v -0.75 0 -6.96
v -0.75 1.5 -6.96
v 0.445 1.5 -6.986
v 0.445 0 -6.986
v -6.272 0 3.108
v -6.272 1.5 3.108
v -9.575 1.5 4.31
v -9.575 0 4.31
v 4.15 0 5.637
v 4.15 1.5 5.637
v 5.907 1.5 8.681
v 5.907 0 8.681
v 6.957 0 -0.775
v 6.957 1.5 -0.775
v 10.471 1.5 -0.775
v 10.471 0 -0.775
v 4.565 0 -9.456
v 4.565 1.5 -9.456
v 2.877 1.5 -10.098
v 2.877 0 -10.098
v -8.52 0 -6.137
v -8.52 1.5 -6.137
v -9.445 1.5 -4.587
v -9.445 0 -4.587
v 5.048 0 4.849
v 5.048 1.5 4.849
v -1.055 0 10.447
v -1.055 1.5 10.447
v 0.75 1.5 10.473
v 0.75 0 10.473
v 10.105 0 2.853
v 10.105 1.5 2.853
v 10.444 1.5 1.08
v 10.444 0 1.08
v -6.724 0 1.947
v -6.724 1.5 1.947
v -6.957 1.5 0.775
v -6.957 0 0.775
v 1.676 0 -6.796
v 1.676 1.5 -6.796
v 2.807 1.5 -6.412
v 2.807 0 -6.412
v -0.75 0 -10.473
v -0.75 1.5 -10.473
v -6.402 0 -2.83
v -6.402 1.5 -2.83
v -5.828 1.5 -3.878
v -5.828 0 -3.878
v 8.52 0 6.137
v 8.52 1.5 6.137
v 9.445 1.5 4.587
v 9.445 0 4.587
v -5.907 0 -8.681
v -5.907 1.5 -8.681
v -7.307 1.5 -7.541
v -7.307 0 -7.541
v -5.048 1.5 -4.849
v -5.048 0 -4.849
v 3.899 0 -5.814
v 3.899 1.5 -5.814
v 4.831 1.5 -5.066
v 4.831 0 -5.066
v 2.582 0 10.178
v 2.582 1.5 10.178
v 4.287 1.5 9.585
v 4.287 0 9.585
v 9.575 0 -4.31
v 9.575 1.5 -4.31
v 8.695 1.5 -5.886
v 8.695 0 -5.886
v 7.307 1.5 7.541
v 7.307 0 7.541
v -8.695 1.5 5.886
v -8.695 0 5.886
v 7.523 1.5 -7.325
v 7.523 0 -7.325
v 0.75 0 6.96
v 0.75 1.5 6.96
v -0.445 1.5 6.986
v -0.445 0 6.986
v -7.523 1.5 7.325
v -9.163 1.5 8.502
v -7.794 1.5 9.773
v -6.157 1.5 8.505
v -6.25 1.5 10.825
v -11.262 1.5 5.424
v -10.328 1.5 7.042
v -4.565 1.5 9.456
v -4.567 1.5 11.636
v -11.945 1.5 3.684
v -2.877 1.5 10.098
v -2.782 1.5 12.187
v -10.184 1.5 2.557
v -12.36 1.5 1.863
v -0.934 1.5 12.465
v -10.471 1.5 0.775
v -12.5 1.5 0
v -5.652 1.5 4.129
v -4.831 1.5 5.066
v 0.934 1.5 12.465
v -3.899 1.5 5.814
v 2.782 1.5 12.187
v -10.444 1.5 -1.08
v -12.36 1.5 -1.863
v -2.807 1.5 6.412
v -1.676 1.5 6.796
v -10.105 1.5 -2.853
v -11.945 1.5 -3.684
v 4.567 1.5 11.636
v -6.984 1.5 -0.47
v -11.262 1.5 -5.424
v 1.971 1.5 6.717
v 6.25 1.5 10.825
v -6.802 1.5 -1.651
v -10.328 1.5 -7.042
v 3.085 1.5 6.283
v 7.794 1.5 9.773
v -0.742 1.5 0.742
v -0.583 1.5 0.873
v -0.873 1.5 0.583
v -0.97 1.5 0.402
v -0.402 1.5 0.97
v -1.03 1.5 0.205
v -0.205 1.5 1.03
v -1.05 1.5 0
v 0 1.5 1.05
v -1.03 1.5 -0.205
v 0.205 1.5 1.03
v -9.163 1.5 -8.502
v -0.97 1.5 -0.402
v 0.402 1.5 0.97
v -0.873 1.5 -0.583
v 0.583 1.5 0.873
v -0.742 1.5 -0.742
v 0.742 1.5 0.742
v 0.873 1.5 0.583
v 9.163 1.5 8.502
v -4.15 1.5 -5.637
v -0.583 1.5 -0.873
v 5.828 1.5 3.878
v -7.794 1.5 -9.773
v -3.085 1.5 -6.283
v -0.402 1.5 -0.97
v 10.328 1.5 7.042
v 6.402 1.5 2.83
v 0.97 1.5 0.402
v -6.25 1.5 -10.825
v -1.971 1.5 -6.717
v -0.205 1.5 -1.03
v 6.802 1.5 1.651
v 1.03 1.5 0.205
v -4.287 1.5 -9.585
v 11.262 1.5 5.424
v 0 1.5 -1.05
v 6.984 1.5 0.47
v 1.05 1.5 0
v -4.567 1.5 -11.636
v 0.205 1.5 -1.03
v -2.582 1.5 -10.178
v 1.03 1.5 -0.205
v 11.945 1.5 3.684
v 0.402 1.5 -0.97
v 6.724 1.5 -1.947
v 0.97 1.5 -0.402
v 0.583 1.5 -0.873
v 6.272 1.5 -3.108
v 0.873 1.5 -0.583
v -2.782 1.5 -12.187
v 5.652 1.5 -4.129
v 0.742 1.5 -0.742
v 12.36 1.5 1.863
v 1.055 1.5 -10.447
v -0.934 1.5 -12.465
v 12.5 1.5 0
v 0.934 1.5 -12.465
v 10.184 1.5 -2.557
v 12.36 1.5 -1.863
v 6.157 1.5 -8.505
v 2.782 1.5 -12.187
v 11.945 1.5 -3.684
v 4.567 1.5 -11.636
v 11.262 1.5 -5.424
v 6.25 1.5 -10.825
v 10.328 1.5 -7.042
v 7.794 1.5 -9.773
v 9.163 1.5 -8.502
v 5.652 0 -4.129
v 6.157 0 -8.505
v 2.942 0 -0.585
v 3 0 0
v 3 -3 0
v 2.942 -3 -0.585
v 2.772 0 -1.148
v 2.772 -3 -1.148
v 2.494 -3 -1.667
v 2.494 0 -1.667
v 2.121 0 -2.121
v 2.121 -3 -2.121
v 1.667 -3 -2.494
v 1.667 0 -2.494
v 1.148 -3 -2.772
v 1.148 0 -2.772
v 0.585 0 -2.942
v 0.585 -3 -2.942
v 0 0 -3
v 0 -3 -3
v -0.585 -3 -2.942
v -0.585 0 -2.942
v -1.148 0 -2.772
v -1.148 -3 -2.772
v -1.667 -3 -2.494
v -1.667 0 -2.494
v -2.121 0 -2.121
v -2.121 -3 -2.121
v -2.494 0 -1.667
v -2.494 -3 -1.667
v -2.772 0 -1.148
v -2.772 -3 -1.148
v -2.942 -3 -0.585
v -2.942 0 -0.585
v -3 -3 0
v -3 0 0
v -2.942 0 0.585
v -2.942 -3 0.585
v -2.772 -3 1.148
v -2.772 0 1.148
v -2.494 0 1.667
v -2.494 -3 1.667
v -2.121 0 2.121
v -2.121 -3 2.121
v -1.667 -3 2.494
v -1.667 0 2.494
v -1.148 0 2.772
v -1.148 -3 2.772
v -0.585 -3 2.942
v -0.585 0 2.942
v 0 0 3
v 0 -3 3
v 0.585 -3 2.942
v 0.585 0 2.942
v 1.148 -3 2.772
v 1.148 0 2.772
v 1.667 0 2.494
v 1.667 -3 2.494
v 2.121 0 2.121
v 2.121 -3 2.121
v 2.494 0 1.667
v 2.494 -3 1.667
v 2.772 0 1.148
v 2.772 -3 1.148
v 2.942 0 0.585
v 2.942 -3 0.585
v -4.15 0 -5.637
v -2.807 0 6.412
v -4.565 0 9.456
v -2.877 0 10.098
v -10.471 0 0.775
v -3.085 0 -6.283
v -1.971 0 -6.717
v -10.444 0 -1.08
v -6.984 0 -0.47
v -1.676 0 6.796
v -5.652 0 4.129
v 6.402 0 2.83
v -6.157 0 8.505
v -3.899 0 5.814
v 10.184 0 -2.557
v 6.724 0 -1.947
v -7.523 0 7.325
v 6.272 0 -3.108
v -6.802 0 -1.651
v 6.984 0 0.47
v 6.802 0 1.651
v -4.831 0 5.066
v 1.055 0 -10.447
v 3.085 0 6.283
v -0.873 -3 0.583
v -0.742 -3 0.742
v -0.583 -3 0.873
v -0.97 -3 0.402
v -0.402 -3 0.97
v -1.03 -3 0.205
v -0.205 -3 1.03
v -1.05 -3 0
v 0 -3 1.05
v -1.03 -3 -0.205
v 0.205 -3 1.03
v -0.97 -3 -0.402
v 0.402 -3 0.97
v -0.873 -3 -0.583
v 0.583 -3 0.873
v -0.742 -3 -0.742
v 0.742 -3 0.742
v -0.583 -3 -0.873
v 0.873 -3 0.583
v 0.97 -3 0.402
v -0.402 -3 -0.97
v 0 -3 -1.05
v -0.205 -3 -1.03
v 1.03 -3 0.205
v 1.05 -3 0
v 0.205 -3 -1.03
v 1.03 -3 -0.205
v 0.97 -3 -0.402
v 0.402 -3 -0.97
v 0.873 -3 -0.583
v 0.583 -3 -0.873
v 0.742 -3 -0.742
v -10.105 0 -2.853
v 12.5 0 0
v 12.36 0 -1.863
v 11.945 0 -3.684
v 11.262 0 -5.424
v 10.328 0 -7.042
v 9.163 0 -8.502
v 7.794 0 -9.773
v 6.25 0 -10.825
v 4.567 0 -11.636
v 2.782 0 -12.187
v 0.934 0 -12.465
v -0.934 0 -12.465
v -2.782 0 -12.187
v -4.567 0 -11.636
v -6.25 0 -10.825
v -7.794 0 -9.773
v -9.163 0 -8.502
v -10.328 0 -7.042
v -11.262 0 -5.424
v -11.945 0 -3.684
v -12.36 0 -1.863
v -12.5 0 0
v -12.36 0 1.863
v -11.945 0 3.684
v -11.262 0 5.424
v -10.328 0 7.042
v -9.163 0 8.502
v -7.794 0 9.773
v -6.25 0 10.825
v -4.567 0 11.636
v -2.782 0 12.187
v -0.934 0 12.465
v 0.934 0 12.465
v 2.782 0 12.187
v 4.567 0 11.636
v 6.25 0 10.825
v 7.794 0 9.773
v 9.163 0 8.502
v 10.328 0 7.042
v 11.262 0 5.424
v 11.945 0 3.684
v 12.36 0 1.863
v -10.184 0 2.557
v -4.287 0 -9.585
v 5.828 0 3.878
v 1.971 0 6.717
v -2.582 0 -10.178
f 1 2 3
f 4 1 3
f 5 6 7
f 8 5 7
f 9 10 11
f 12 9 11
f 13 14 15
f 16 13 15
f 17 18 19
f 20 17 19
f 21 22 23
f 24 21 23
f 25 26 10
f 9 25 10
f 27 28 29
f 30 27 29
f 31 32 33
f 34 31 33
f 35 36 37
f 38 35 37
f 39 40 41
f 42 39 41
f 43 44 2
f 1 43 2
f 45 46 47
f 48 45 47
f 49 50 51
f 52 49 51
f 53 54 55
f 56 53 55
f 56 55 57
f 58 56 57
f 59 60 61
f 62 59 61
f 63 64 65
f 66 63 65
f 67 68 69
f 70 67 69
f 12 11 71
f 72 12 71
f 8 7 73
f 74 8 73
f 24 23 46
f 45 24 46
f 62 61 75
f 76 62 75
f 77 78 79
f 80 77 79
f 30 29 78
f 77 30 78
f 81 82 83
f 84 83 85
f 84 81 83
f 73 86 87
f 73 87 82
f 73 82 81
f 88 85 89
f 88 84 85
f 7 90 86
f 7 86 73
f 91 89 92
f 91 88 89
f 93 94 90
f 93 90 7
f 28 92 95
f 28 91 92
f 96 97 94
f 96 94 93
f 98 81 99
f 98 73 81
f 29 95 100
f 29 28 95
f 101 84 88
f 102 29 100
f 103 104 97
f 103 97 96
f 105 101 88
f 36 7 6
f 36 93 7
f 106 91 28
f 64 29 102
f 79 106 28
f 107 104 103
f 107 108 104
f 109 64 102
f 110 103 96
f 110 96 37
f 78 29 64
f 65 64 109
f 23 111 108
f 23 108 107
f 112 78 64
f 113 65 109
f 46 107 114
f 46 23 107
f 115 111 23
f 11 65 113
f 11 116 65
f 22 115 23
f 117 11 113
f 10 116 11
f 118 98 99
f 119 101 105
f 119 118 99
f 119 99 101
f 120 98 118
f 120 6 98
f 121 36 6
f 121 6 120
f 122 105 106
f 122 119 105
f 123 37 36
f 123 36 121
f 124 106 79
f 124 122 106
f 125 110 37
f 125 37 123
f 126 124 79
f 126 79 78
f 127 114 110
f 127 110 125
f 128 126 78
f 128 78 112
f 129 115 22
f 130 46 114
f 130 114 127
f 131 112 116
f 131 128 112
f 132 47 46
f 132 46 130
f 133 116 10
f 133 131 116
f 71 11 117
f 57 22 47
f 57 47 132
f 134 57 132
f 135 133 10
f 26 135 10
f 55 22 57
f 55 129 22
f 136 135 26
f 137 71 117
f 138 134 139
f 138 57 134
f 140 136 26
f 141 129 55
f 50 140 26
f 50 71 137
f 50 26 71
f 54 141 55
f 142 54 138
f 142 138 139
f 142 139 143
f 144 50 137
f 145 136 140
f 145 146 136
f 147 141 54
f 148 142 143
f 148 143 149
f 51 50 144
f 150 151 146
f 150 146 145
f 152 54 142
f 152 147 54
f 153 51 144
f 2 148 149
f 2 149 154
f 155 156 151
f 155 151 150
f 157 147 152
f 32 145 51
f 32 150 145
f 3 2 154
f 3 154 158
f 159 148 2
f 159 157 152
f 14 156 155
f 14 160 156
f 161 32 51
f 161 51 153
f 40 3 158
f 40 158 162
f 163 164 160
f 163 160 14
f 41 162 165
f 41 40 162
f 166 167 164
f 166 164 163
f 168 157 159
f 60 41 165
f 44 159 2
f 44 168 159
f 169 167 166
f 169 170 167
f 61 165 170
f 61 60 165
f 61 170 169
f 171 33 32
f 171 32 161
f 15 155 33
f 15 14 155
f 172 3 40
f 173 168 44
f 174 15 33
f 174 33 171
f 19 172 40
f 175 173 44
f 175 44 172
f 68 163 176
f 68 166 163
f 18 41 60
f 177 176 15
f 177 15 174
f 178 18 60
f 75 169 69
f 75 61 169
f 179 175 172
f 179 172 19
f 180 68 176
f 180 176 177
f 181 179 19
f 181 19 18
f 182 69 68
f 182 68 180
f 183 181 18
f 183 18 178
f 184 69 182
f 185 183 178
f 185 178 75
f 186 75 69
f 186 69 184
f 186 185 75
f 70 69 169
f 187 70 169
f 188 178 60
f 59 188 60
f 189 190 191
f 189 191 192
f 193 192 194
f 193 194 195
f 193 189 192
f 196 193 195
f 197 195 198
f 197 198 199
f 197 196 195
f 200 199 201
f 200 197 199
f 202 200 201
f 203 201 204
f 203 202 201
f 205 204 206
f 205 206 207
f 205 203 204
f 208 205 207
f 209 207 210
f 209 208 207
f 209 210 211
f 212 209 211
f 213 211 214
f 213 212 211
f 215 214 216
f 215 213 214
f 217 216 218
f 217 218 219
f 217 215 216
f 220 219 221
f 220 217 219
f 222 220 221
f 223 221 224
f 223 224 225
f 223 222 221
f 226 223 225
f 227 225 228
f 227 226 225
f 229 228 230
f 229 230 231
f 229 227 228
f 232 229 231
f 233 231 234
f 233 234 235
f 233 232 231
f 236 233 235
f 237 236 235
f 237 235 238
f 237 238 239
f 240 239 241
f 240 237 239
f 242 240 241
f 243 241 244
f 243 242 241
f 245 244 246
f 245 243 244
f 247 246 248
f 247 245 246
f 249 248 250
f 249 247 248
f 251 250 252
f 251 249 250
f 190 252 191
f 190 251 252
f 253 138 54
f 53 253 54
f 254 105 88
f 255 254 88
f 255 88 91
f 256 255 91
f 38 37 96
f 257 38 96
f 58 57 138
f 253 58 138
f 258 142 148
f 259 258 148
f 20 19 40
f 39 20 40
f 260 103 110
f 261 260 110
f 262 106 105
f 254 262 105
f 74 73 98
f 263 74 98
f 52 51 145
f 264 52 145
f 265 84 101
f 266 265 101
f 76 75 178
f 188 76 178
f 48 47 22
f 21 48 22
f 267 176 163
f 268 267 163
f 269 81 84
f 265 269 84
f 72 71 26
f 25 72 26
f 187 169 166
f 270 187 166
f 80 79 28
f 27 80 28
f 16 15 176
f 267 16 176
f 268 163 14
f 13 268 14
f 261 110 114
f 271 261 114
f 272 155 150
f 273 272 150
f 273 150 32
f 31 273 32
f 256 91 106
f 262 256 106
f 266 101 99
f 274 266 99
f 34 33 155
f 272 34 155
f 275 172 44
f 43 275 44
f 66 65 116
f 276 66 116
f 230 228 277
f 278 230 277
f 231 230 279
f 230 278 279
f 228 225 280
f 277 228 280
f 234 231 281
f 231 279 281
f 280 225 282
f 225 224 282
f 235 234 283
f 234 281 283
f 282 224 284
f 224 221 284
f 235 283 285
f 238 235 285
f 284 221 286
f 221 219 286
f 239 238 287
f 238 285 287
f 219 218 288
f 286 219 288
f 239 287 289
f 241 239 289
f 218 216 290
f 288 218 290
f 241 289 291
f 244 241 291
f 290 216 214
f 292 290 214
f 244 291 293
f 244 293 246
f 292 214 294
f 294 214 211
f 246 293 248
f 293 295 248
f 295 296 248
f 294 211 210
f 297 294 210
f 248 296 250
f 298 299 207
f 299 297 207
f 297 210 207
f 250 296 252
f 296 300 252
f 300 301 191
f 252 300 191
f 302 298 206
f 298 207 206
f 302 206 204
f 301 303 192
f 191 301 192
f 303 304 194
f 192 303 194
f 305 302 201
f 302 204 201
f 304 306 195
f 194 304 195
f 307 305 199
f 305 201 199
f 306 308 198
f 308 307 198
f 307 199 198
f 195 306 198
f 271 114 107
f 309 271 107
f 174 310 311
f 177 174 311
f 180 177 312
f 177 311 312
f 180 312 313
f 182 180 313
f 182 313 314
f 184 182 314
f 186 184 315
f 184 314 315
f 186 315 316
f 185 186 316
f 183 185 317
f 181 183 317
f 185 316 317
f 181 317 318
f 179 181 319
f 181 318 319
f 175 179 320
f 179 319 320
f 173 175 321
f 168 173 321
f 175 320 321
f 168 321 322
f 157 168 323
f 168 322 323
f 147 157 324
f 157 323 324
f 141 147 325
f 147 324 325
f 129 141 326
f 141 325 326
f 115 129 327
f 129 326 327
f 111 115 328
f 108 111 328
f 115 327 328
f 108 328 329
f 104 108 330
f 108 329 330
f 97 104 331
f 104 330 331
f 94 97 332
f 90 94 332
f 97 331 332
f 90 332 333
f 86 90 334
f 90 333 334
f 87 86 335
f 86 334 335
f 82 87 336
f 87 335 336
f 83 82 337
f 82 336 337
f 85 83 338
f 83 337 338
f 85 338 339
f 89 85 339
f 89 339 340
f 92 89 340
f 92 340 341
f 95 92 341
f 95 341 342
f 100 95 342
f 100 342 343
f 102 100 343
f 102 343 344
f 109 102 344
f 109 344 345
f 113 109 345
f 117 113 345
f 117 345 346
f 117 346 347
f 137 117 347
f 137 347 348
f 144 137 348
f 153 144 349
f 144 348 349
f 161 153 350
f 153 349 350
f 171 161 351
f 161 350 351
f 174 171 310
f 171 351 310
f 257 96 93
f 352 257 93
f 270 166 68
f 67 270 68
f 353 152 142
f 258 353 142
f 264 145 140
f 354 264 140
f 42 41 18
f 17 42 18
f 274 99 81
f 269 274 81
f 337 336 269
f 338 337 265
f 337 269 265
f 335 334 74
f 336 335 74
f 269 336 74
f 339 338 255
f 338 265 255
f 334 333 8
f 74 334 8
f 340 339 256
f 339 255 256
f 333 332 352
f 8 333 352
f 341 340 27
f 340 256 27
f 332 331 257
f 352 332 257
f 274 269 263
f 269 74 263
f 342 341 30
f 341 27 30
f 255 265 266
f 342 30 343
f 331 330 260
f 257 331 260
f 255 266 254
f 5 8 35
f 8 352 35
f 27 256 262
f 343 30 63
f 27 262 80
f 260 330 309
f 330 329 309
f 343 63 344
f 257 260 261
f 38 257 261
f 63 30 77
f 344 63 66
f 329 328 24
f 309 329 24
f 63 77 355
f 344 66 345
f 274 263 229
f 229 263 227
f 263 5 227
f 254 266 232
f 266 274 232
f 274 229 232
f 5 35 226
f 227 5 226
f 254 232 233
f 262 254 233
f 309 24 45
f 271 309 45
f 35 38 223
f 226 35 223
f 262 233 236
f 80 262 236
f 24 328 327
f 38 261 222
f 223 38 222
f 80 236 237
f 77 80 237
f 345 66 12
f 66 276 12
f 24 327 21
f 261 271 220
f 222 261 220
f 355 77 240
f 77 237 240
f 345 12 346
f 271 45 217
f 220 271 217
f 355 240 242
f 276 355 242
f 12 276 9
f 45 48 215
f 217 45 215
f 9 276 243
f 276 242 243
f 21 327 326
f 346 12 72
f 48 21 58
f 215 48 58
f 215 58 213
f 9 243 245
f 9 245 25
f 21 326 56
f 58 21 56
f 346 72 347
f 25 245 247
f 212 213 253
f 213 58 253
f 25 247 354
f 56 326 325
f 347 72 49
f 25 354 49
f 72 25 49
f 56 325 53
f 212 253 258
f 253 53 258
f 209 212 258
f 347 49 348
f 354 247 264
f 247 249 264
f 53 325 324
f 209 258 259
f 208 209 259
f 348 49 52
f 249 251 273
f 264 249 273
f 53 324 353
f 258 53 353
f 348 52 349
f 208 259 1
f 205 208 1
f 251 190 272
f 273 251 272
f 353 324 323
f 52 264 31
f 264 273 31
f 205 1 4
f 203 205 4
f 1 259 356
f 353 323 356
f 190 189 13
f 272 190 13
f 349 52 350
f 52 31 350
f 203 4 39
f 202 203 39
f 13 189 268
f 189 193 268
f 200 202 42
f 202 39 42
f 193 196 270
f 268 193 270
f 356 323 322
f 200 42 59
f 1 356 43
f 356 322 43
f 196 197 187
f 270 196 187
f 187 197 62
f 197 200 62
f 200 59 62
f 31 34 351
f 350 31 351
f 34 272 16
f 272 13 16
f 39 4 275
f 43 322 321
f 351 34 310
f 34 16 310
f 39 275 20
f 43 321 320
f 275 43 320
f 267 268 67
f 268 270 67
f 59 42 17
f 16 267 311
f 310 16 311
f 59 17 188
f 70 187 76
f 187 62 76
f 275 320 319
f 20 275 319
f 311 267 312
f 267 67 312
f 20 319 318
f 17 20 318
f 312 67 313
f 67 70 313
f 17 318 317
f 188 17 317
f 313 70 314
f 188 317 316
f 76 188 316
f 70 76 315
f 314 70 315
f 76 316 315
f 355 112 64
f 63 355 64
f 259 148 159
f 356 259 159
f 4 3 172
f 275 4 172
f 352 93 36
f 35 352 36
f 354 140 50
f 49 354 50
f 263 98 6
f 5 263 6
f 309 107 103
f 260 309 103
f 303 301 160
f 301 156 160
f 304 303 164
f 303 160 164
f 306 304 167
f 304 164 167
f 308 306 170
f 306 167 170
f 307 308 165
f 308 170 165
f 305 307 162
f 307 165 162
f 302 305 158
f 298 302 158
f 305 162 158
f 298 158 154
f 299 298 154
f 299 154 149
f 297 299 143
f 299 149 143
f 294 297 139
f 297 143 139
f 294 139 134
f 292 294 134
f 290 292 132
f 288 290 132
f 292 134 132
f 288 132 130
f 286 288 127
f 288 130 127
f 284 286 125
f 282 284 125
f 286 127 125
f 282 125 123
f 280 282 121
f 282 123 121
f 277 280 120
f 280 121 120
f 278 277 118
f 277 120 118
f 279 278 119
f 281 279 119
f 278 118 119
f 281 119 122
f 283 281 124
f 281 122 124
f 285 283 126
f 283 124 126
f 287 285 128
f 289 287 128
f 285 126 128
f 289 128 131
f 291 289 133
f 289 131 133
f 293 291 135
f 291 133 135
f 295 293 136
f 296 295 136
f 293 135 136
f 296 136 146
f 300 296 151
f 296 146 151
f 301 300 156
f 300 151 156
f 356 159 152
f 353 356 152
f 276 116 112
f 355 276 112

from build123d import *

# Parameters (mm, degrees)
SKETCH_1_R               = 12.5
EXTRUDE_1_DEPTH          = 1.5
CUT_EXTRUDE_1_DEPTH      = 2
SKETCH_3_R               = 1.05
CUT_EXTRUDE_2_DEPTH      = 22
EXTRUDE_START            = -1.5
SKETCH_4_R               = 3
EXTRUDE_2_DEPTH          = 3
PATTERN_CIRCULAR_1_COUNT = 18
SKETCH_5_R               = 1.05
CUT_EXTRUDE_3_DEPTH      = 23


with BuildPart() as part:
    # 스케치1 → 보스-돌출1 (new body)
    with BuildSketch(Plane(origin=(0, 0, 0), x_dir=(1, 0, 0), z_dir=(0, 1, 0))):
        Circle(SKETCH_1_R)
    extrude(amount=EXTRUDE_1_DEPTH)

    # 스케치2 → 컷-돌출1 (cut)
    with BuildSketch(Plane(origin=(0, 1.5, 0), x_dir=(1, 0, 0), z_dir=(0, 1, 0))):
        Polygon((-0.75, 6.959705454), (0.444838448, 6.985851326), (1.05510653, 10.446853603), (-0.75, 10.473180033), align=None)
    cut_extrude_1 = extrude(amount=-CUT_EXTRUDE_1_DEPTH, mode=Mode.SUBTRACT)

    # 스케치3 → 컷-돌출2 (cut)
    with BuildSketch(Plane(origin=(0, 1.5, 0), x_dir=(1, 0, 0), z_dir=(0, 1, 0))):
        Circle(SKETCH_3_R)
    extrude(amount=-CUT_EXTRUDE_2_DEPTH, mode=Mode.SUBTRACT)

    # 스케치4 → 보스-돌출2 (add)
    with BuildSketch(Plane(origin=(0, 1.5, 0), x_dir=(1, 0, 0), z_dir=(0, 1, 0)).offset(EXTRUDE_START)):
        Circle(SKETCH_4_R)
    extrude(amount=-EXTRUDE_2_DEPTH)

    # 원형 패턴1: 컷-돌출1 ×18 about axis
    pattern_circular_1_axis = Axis((0, 0, 0), (0, 1, 0))
    for i in range(1, PATTERN_CIRCULAR_1_COUNT):
        add(cut_extrude_1.rotate(pattern_circular_1_axis, i * 360 / PATTERN_CIRCULAR_1_COUNT), mode=Mode.SUBTRACT)

    # 스케치5 → 컷-돌출3 (cut)
    with BuildSketch(Plane(origin=(0, 1.5, 0), x_dir=(1, 0, 0), z_dir=(0, 1, 0))):
        Circle(SKETCH_5_R)
    extrude(amount=-CUT_EXTRUDE_3_DEPTH, mode=Mode.SUBTRACT)


solid = part.part
